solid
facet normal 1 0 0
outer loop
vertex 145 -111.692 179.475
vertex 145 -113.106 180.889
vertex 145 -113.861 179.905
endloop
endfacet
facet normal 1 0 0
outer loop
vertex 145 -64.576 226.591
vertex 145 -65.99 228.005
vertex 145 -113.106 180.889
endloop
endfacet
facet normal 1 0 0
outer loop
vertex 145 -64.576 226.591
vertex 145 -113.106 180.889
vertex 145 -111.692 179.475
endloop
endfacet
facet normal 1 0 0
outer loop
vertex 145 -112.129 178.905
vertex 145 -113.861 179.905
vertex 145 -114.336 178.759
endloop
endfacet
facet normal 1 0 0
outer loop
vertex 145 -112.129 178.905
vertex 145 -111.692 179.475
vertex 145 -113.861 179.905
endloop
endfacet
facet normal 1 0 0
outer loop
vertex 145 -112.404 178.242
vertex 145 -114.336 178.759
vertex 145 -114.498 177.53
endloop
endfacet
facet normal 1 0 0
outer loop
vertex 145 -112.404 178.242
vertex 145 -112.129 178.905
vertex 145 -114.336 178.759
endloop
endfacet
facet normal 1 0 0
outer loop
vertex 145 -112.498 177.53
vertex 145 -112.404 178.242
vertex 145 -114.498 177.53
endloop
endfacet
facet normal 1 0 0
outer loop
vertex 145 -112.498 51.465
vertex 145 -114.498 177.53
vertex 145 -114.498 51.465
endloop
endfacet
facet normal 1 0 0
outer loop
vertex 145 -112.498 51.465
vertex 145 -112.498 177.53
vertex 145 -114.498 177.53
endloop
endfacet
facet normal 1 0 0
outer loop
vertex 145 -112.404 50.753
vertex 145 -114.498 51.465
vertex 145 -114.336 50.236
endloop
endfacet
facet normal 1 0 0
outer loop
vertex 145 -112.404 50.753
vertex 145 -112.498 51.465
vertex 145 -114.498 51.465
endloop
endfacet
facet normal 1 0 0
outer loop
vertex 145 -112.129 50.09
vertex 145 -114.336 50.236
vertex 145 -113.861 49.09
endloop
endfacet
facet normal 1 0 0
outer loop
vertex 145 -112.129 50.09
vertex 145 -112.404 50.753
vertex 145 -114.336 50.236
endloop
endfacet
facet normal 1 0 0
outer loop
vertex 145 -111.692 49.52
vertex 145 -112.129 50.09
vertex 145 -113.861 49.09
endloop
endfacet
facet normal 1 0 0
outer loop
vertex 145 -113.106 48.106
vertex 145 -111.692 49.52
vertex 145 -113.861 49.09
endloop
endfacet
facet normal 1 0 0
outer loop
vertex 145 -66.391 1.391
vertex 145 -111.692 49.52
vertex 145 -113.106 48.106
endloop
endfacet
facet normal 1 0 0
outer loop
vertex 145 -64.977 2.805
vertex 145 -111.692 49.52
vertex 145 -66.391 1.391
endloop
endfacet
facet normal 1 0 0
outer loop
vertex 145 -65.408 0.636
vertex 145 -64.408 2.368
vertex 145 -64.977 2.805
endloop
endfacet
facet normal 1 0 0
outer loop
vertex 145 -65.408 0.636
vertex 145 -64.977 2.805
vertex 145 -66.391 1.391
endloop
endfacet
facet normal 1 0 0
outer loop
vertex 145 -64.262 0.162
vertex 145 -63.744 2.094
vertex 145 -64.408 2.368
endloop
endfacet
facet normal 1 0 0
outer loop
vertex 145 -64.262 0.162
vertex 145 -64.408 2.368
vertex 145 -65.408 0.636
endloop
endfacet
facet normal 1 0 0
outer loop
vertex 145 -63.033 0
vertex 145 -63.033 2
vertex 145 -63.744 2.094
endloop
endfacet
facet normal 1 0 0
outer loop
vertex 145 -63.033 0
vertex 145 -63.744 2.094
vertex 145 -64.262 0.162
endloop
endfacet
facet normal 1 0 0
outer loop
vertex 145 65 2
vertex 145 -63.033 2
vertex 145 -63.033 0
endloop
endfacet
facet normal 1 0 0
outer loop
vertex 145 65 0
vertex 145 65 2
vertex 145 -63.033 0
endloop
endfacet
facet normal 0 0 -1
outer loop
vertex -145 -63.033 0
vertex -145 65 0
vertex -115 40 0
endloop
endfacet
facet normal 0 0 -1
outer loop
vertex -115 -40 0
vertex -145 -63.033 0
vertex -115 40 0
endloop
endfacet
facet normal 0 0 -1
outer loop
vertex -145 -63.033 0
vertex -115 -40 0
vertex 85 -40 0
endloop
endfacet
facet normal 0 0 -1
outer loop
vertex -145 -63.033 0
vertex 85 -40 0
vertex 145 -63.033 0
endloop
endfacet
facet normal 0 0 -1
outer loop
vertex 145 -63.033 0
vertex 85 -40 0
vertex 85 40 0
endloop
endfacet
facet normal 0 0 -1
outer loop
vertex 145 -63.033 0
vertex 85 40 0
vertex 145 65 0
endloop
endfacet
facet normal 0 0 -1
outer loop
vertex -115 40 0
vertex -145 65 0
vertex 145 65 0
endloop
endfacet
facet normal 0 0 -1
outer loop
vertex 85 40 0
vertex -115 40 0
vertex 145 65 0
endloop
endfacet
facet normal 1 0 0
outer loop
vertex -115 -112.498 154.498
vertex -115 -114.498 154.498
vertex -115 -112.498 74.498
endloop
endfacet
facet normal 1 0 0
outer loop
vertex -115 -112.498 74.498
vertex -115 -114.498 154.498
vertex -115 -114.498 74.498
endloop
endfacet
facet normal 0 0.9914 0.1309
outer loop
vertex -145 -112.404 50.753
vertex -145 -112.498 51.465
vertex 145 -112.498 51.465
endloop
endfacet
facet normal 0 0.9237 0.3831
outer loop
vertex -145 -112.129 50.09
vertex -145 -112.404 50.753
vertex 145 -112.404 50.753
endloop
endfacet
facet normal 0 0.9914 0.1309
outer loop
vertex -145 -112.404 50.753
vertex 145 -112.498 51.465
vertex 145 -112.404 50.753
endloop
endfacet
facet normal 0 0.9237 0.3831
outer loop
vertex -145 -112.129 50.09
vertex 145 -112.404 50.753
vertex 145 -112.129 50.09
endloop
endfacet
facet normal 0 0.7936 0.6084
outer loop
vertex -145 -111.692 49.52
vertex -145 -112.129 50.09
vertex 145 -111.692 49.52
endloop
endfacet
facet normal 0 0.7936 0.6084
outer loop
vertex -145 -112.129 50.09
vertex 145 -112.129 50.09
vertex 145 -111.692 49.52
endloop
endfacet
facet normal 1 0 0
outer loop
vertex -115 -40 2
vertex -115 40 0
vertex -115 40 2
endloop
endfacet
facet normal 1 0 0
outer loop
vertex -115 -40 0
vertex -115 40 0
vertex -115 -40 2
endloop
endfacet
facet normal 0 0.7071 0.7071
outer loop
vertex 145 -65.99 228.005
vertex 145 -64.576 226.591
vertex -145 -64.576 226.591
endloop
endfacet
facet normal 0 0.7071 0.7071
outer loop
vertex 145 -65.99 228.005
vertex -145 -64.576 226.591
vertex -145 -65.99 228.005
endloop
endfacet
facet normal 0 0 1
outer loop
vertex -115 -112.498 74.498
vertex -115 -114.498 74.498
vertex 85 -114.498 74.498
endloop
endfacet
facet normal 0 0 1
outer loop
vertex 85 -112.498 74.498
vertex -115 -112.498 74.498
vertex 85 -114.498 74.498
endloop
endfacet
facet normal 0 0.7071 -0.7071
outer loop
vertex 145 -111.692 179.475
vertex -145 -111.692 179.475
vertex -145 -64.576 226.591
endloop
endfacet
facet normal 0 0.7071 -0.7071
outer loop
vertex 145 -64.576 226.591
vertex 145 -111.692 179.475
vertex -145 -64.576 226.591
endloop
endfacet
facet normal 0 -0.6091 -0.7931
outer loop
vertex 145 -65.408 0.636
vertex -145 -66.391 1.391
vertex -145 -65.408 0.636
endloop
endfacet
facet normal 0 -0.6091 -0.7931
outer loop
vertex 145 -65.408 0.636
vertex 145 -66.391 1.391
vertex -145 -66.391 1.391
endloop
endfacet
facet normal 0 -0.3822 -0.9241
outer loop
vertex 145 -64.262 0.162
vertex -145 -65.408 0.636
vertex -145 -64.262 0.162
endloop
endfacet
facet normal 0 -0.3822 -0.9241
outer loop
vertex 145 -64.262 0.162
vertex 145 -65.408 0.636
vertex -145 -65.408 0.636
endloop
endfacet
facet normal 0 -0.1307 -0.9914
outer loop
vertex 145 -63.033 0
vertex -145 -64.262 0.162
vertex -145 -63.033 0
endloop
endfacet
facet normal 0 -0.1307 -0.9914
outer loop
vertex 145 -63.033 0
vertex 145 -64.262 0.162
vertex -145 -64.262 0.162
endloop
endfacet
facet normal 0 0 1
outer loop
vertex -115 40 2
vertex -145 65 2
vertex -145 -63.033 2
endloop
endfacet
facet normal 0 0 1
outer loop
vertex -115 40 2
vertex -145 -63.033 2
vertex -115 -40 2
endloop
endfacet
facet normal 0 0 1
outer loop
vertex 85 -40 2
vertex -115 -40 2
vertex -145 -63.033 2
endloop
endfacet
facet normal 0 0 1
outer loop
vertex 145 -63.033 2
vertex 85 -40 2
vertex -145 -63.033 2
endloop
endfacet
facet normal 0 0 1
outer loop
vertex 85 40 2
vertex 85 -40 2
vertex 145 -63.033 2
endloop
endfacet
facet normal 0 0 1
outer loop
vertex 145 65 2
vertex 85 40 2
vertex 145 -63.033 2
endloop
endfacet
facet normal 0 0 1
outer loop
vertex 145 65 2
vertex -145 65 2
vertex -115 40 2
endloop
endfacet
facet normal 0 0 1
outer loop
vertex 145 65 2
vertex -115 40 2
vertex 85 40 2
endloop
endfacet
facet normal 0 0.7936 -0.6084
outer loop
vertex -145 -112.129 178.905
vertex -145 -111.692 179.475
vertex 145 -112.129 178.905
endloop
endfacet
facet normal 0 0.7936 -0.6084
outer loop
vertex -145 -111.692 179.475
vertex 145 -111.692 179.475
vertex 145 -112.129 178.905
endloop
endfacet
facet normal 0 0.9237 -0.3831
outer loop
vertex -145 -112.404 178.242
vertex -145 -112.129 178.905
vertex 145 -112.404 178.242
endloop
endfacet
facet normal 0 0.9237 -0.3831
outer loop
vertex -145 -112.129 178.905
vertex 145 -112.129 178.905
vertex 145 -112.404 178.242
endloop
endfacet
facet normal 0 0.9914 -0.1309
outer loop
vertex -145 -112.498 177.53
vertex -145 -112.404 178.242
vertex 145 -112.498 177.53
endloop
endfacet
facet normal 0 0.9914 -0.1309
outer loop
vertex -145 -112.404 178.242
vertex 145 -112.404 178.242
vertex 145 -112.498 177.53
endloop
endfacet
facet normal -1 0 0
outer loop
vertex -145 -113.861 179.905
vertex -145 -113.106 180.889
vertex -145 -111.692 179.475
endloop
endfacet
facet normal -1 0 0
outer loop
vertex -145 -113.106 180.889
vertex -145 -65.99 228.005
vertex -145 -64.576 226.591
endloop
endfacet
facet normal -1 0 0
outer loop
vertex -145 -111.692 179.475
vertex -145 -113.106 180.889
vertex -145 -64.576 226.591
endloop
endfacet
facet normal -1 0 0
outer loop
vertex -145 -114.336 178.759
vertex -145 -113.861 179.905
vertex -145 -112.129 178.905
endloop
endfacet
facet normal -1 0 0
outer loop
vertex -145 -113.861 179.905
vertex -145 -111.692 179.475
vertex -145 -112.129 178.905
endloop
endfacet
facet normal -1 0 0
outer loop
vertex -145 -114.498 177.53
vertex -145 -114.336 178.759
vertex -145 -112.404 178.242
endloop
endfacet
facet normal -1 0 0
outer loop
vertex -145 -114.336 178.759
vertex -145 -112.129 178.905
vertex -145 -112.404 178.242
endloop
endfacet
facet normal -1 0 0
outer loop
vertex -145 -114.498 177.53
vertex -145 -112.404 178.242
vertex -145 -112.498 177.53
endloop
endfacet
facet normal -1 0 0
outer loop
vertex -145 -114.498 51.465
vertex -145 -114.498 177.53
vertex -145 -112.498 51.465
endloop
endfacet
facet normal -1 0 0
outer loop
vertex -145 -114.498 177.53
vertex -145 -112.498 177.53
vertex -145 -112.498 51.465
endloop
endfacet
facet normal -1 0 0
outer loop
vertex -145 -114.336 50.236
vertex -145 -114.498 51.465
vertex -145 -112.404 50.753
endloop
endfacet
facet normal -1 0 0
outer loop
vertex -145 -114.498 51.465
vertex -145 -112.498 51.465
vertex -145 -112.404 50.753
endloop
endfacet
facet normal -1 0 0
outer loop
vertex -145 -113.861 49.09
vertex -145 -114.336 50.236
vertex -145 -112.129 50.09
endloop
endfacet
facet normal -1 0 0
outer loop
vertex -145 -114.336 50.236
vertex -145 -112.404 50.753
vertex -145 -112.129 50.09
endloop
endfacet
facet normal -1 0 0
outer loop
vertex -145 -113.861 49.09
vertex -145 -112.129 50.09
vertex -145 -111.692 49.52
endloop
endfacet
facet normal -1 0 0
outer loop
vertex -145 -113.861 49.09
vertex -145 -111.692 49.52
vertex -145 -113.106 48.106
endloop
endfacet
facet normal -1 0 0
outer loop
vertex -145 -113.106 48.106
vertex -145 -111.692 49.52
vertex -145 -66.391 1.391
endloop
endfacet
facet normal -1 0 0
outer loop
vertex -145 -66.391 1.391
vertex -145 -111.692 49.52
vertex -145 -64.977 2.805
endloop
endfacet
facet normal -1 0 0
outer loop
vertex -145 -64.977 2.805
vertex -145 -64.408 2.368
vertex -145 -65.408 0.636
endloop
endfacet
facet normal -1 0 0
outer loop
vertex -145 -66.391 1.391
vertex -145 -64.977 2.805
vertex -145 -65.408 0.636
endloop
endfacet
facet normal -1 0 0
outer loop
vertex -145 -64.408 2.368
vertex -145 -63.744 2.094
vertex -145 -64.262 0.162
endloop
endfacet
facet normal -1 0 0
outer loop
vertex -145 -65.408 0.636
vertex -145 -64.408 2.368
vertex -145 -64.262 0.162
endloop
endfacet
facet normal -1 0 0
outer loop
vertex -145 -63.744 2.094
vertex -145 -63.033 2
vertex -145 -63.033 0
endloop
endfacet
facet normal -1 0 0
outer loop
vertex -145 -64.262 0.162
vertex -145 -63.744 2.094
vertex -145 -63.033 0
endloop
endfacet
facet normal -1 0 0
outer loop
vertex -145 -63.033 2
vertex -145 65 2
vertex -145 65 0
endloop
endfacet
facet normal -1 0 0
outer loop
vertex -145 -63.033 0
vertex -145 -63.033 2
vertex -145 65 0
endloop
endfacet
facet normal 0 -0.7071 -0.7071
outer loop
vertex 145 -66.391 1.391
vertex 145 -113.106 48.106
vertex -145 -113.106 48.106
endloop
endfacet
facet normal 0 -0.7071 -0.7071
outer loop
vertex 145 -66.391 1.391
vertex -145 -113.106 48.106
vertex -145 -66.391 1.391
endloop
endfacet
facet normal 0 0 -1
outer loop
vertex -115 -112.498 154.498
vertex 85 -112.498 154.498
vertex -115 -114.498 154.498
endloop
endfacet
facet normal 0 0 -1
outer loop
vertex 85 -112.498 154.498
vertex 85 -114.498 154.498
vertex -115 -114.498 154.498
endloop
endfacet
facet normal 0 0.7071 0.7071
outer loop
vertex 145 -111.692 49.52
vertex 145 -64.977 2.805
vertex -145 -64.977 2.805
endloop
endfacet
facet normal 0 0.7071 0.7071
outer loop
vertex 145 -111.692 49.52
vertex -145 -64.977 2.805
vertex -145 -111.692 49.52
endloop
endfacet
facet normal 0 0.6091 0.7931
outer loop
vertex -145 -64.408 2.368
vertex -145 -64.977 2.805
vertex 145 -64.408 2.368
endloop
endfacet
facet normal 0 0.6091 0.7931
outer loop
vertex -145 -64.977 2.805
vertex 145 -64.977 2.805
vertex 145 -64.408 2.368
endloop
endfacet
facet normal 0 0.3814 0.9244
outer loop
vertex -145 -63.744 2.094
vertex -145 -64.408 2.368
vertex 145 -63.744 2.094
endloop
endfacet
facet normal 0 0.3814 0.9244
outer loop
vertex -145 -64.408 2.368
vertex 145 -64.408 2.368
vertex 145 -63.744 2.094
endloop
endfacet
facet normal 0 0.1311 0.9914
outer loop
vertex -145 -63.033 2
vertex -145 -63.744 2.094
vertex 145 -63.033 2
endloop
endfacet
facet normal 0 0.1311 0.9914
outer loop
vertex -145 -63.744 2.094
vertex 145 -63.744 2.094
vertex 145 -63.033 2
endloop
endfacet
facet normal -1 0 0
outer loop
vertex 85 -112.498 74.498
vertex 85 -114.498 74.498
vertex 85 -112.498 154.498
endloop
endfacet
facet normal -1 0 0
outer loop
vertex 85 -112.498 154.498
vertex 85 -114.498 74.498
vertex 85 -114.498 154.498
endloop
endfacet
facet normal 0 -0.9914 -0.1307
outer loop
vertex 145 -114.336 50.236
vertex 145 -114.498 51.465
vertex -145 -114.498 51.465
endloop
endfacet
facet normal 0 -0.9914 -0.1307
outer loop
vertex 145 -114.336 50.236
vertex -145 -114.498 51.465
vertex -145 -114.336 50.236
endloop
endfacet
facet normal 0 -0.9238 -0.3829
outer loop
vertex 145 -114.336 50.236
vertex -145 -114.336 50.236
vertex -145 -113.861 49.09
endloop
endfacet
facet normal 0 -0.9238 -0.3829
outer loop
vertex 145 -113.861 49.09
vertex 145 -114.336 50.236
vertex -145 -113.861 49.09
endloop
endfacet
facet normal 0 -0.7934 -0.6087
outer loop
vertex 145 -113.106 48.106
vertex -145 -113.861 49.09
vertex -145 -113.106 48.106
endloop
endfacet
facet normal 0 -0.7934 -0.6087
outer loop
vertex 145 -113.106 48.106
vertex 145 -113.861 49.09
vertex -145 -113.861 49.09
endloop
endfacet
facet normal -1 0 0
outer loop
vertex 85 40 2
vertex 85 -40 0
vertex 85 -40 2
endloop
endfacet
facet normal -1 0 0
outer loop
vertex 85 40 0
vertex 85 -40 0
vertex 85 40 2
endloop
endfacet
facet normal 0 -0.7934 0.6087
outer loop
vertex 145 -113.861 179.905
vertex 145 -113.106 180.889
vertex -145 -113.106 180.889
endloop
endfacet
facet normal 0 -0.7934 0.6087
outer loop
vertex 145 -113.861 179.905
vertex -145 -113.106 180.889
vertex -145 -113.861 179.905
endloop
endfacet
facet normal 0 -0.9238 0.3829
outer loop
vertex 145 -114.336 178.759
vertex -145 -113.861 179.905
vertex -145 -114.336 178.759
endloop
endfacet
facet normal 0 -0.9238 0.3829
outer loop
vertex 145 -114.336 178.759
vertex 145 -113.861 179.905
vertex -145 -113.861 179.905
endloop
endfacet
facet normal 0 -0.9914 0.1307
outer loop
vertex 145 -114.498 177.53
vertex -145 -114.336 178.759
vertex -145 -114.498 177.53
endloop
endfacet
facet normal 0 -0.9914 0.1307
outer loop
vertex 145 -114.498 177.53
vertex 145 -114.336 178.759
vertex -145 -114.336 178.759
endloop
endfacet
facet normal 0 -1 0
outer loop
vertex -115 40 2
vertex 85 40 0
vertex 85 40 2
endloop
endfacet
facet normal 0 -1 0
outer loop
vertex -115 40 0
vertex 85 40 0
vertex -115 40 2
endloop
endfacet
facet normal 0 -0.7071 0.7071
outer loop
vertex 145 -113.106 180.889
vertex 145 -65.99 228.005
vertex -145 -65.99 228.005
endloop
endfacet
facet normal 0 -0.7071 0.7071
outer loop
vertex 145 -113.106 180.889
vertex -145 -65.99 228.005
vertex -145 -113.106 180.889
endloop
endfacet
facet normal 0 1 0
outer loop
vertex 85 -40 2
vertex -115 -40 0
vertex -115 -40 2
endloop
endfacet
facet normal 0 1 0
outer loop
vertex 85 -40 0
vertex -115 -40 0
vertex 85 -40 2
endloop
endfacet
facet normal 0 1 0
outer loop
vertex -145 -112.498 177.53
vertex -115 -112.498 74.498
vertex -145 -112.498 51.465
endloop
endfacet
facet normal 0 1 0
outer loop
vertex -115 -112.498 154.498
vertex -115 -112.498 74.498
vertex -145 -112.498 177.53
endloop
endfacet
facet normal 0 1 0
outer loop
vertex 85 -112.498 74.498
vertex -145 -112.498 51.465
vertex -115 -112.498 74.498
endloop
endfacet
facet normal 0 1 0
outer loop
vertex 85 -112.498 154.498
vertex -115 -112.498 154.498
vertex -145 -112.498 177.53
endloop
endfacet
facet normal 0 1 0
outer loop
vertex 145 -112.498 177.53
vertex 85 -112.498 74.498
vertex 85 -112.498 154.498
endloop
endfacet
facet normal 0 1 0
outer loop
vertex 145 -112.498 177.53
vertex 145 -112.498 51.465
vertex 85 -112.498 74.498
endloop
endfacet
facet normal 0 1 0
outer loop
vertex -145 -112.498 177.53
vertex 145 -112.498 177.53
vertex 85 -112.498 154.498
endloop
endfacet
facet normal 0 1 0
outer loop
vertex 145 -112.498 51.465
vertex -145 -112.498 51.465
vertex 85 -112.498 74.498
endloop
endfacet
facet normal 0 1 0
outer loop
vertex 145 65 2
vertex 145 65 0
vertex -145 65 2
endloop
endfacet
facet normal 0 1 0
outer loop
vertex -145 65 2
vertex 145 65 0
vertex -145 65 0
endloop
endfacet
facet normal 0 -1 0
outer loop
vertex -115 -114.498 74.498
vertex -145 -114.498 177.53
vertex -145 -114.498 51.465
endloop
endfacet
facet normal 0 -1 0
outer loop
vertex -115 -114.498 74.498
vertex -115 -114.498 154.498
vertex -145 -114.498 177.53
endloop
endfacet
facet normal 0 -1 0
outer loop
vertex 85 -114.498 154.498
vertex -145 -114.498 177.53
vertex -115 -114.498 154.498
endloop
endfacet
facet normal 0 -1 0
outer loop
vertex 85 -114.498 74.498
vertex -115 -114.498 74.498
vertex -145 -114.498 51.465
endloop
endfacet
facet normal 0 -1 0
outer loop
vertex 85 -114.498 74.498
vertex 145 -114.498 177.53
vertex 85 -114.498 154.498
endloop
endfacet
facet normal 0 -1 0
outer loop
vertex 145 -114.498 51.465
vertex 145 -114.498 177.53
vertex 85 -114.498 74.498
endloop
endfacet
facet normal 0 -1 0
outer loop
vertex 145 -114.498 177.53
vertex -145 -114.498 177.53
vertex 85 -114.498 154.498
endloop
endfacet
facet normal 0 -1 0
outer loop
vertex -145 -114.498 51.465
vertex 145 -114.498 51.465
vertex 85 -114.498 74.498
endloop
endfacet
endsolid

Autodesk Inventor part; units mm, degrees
ref_plane "YZ Plane" through (0, 0, 0) normal (1, 0, 0) x (0, 1, 0)
ref_plane "XZ Plane" through (0, 0, 0) normal (0, 1, 0) x (-1, 0, 0)
ref_plane "XY Plane" through (0, 0, 0) normal (0, 0, 1) x (1, 0, 0)
sketch "Sketch1" plane through (0, 0, 0) normal (0, 0, 1) x (1, 0, 0)
  line L0 (145, 65) -> (-145, 65)
  line L1 (-145, 65) -> (-145, -65)
  line L2 (-145, -65) -> (145, -65)
  line L3 (145, -65) -> (145, 65)
  line L4 (145, 65) -> (-145, -65) construction
  line L5 (-145, 65) -> (145, -65) construction
  line L6 (85, 40) -> (-115, 40)
  line L7 (-115, 40) -> (-115, -40)
  line L8 (-115, -40) -> (85, -40)
  line L9 (85, -40) -> (85, 40)
  line L10 (85, 40) -> (-115, -40) construction
  line L11 (-115, 40) -> (85, -40) construction
  point P0 (0, 0)
  point P1 (0, 0)
  point P2 (-15, 0)
  point P3 (85, 0)
  point P4 (145, 0)
  dimension "d34" = 200
  dimension "d35" = 80
  dimension "d51" = 60
  dimension "d53" = 30
  dimension "d54" = 25
  dimension "d56" = 130
extrude "Plate1" add sketch "Sketch1" along normal blind 2
sketch "Sketch6" plane through (145, -63.5858, 1.4142) normal (0, -0.7071068, -0.7071068) x (1, 0, 0)
  line L0 (-290, 0) -> (0, 0)
  line L1 (0, 0) -> (0, 70)
  line L2 (0, 70) -> (-290, 70)
  line L3 (-290, 70) -> (-290, 0)
edge flange "Flange2" height 70 angle 45 thickness 2 bend radius 2.75 thickness toward (0, -0.7071068, -0.7071068) relief round relief width 2 relief depth 1 edges at (0, -65, 2) wall of the first edge with corners at (-145, -63.5858, 1.4142) (145, -63.5858, 1.4142) (145, -113.0833, 50.9117) (-145, -113.0833, 50.9117)
bend "Bend2"
corner "Corner2"
sketch "Sketch8" plane through (145, -112.4975, 49.4975) normal (0, -1, 0) x (1, 0, 0)
  line L0 (-290, 0) -> (0, 0)
  line L1 (0, 0) -> (0, 130)
  line L2 (0, 130) -> (-290, 130)
  line L3 (-290, 130) -> (-290, 0)
edge flange "Flange3" height 130 angle 45 thickness 2 bend radius 2.75 thickness toward (0, -1, 0) relief round relief width 2 relief depth 1 edges at (0, -113.0833, 50.9117) wall of the first edge with corners at (-145, -112.4975, 49.4975) (145, -112.4975, 49.4975) (145, -112.4975, 179.4975) (-145, -112.4975, 179.4975)
bend "Bend3"
corner "Corner3"
sketch "Sketch9" plane through (145, -113.0833, 178.0833) normal (0, -0.7071068, 0.7071068) x (1, 0, 0)
  line L0 (-290, 0) -> (0, 0)
  line L1 (0, 0) -> (0, 68.6)
  line L2 (0, 68.6) -> (-290, 68.6)
  line L3 (-290, 68.6) -> (-290, 0)
edge flange "Flange4" height 68.6 angle 45 thickness 2 bend radius 2.75 thickness toward (0, -0.7071068, 0.7071068) relief round relief width 2 relief depth 1 edges at (0, -112.4975, 179.4975) wall of the first edge with corners at (-145, -113.0833, 178.0833) (145, -113.0833, 178.0833) (145, -64.5757, 226.5908) (-145, -64.5757, 226.5908)
bend "Bend4"
corner "Corner4"
sketch "Sketch10" plane through (-145, -114.4975, 51.465) normal (0, -1, 0) x (1, 0, 0)
  line L0 (290, 126.065) -> (0, 126.065) projected
  line L1 (0, 0) -> (0, 126.065) projected
  line L2 (0, 0) -> (290, 0) projected
  line L3 (290, 126.065) -> (290, 0) projected
  line L4 (30, 23.0325) -> (230, 23.0325)
  line L5 (230, 23.0325) -> (230, 103.0325)
  line L6 (230, 103.0325) -> (30, 103.0325)
  line L7 (30, 103.0325) -> (30, 23.0325)
  point P0 (145, -51.465)
  point P1 (30, 63.0325)
  point P2 (0, 63.0325)
  dimension "d77" = 80
  dimension "d78" = 200
  dimension "d79" = 30
extrude "Cut3" cut sketch "Sketch10" against normal blind 2 contours L7 L6 L5 L4
equation "\"d34\" = MAIN_6_central_window_hight"
equation "\"d35\" = MAIN_7_central_window_width"
equation "\"d56\" = Wall_1_width"
equation "\"d77\" = MAIN_7_central_window_width"
equation "\"d78\" = MAIN_6_central_window_hight"
equation "\"d79\" = d53"
equation "\"d80\" = Thickness"
equation "\"d2\" = Thickness"
equation "\"d36\" = BendReliefWidth"
equation "\"d37\" = BendReliefDepth"
equation "\"d38\" = MinimumRemnant"
equation "\"d39\" = TransitionRadius"
equation "\"d40\" = Wall_2_width"
equation "\"d42\" = BendRadius"
equation "\"d43\" = CornerReliefSize"
equation "\"d44\" = GapSize"
equation "\"d45\" = JacobiRadiusSize"
equation "\"d57\" = BendReliefWidth"
equation "\"d58\" = BendReliefDepth"
equation "\"d59\" = MinimumRemnant"
equation "\"d60\" = TransitionRadius"
equation "\"d61\" = d56"
equation "\"d63\" = BendRadius"
equation "\"d64\" = CornerReliefSize"
equation "\"d65\" = GapSize"
equation "\"d66\" = JacobiRadiusSize"
equation "\"d67\" = BendReliefWidth"
equation "\"d68\" = BendReliefDepth"
equation "\"d69\" = MinimumRemnant"
equation "\"d70\" = TransitionRadius"
equation "\"d71\" = Wall_2_width - 0.7 * Thickness"
equation "\"d73\" = BendRadius"
equation "\"d74\" = CornerReliefSize"
equation "\"d75\" = GapSize"
equation "\"d76\" = JacobiRadiusSize"
equation "\"BendReliefWidth\" = Thickness"
equation "\"BendReliefDepth\" = 0.5 * Thickness"
equation "\"CornerReliefSize\" = 4 * Thickness"
equation "\"MinimumRemnant\" = 2 * Thickness"
equation "\"TransitionRadius\" = BendRadius"
equation "\"JacobiRadiusSize\" = BendRadius"
equation "\"GapSize\" = Thickness"
equation "\"MAIN_6_central_window_hight\" = 200"
equation "\"MAIN_7_central_window_width\" = 80"
equation "\"Wall_1_width\" = 130"
equation "\"Thickness\" = 2"
equation "\"Wall_2_width\" = 70"
equation "\"BendRadius\" = 2.75"
properties part number "TKS 3554 BOTTOM DS box wall 1" material "Stainless Steel"
